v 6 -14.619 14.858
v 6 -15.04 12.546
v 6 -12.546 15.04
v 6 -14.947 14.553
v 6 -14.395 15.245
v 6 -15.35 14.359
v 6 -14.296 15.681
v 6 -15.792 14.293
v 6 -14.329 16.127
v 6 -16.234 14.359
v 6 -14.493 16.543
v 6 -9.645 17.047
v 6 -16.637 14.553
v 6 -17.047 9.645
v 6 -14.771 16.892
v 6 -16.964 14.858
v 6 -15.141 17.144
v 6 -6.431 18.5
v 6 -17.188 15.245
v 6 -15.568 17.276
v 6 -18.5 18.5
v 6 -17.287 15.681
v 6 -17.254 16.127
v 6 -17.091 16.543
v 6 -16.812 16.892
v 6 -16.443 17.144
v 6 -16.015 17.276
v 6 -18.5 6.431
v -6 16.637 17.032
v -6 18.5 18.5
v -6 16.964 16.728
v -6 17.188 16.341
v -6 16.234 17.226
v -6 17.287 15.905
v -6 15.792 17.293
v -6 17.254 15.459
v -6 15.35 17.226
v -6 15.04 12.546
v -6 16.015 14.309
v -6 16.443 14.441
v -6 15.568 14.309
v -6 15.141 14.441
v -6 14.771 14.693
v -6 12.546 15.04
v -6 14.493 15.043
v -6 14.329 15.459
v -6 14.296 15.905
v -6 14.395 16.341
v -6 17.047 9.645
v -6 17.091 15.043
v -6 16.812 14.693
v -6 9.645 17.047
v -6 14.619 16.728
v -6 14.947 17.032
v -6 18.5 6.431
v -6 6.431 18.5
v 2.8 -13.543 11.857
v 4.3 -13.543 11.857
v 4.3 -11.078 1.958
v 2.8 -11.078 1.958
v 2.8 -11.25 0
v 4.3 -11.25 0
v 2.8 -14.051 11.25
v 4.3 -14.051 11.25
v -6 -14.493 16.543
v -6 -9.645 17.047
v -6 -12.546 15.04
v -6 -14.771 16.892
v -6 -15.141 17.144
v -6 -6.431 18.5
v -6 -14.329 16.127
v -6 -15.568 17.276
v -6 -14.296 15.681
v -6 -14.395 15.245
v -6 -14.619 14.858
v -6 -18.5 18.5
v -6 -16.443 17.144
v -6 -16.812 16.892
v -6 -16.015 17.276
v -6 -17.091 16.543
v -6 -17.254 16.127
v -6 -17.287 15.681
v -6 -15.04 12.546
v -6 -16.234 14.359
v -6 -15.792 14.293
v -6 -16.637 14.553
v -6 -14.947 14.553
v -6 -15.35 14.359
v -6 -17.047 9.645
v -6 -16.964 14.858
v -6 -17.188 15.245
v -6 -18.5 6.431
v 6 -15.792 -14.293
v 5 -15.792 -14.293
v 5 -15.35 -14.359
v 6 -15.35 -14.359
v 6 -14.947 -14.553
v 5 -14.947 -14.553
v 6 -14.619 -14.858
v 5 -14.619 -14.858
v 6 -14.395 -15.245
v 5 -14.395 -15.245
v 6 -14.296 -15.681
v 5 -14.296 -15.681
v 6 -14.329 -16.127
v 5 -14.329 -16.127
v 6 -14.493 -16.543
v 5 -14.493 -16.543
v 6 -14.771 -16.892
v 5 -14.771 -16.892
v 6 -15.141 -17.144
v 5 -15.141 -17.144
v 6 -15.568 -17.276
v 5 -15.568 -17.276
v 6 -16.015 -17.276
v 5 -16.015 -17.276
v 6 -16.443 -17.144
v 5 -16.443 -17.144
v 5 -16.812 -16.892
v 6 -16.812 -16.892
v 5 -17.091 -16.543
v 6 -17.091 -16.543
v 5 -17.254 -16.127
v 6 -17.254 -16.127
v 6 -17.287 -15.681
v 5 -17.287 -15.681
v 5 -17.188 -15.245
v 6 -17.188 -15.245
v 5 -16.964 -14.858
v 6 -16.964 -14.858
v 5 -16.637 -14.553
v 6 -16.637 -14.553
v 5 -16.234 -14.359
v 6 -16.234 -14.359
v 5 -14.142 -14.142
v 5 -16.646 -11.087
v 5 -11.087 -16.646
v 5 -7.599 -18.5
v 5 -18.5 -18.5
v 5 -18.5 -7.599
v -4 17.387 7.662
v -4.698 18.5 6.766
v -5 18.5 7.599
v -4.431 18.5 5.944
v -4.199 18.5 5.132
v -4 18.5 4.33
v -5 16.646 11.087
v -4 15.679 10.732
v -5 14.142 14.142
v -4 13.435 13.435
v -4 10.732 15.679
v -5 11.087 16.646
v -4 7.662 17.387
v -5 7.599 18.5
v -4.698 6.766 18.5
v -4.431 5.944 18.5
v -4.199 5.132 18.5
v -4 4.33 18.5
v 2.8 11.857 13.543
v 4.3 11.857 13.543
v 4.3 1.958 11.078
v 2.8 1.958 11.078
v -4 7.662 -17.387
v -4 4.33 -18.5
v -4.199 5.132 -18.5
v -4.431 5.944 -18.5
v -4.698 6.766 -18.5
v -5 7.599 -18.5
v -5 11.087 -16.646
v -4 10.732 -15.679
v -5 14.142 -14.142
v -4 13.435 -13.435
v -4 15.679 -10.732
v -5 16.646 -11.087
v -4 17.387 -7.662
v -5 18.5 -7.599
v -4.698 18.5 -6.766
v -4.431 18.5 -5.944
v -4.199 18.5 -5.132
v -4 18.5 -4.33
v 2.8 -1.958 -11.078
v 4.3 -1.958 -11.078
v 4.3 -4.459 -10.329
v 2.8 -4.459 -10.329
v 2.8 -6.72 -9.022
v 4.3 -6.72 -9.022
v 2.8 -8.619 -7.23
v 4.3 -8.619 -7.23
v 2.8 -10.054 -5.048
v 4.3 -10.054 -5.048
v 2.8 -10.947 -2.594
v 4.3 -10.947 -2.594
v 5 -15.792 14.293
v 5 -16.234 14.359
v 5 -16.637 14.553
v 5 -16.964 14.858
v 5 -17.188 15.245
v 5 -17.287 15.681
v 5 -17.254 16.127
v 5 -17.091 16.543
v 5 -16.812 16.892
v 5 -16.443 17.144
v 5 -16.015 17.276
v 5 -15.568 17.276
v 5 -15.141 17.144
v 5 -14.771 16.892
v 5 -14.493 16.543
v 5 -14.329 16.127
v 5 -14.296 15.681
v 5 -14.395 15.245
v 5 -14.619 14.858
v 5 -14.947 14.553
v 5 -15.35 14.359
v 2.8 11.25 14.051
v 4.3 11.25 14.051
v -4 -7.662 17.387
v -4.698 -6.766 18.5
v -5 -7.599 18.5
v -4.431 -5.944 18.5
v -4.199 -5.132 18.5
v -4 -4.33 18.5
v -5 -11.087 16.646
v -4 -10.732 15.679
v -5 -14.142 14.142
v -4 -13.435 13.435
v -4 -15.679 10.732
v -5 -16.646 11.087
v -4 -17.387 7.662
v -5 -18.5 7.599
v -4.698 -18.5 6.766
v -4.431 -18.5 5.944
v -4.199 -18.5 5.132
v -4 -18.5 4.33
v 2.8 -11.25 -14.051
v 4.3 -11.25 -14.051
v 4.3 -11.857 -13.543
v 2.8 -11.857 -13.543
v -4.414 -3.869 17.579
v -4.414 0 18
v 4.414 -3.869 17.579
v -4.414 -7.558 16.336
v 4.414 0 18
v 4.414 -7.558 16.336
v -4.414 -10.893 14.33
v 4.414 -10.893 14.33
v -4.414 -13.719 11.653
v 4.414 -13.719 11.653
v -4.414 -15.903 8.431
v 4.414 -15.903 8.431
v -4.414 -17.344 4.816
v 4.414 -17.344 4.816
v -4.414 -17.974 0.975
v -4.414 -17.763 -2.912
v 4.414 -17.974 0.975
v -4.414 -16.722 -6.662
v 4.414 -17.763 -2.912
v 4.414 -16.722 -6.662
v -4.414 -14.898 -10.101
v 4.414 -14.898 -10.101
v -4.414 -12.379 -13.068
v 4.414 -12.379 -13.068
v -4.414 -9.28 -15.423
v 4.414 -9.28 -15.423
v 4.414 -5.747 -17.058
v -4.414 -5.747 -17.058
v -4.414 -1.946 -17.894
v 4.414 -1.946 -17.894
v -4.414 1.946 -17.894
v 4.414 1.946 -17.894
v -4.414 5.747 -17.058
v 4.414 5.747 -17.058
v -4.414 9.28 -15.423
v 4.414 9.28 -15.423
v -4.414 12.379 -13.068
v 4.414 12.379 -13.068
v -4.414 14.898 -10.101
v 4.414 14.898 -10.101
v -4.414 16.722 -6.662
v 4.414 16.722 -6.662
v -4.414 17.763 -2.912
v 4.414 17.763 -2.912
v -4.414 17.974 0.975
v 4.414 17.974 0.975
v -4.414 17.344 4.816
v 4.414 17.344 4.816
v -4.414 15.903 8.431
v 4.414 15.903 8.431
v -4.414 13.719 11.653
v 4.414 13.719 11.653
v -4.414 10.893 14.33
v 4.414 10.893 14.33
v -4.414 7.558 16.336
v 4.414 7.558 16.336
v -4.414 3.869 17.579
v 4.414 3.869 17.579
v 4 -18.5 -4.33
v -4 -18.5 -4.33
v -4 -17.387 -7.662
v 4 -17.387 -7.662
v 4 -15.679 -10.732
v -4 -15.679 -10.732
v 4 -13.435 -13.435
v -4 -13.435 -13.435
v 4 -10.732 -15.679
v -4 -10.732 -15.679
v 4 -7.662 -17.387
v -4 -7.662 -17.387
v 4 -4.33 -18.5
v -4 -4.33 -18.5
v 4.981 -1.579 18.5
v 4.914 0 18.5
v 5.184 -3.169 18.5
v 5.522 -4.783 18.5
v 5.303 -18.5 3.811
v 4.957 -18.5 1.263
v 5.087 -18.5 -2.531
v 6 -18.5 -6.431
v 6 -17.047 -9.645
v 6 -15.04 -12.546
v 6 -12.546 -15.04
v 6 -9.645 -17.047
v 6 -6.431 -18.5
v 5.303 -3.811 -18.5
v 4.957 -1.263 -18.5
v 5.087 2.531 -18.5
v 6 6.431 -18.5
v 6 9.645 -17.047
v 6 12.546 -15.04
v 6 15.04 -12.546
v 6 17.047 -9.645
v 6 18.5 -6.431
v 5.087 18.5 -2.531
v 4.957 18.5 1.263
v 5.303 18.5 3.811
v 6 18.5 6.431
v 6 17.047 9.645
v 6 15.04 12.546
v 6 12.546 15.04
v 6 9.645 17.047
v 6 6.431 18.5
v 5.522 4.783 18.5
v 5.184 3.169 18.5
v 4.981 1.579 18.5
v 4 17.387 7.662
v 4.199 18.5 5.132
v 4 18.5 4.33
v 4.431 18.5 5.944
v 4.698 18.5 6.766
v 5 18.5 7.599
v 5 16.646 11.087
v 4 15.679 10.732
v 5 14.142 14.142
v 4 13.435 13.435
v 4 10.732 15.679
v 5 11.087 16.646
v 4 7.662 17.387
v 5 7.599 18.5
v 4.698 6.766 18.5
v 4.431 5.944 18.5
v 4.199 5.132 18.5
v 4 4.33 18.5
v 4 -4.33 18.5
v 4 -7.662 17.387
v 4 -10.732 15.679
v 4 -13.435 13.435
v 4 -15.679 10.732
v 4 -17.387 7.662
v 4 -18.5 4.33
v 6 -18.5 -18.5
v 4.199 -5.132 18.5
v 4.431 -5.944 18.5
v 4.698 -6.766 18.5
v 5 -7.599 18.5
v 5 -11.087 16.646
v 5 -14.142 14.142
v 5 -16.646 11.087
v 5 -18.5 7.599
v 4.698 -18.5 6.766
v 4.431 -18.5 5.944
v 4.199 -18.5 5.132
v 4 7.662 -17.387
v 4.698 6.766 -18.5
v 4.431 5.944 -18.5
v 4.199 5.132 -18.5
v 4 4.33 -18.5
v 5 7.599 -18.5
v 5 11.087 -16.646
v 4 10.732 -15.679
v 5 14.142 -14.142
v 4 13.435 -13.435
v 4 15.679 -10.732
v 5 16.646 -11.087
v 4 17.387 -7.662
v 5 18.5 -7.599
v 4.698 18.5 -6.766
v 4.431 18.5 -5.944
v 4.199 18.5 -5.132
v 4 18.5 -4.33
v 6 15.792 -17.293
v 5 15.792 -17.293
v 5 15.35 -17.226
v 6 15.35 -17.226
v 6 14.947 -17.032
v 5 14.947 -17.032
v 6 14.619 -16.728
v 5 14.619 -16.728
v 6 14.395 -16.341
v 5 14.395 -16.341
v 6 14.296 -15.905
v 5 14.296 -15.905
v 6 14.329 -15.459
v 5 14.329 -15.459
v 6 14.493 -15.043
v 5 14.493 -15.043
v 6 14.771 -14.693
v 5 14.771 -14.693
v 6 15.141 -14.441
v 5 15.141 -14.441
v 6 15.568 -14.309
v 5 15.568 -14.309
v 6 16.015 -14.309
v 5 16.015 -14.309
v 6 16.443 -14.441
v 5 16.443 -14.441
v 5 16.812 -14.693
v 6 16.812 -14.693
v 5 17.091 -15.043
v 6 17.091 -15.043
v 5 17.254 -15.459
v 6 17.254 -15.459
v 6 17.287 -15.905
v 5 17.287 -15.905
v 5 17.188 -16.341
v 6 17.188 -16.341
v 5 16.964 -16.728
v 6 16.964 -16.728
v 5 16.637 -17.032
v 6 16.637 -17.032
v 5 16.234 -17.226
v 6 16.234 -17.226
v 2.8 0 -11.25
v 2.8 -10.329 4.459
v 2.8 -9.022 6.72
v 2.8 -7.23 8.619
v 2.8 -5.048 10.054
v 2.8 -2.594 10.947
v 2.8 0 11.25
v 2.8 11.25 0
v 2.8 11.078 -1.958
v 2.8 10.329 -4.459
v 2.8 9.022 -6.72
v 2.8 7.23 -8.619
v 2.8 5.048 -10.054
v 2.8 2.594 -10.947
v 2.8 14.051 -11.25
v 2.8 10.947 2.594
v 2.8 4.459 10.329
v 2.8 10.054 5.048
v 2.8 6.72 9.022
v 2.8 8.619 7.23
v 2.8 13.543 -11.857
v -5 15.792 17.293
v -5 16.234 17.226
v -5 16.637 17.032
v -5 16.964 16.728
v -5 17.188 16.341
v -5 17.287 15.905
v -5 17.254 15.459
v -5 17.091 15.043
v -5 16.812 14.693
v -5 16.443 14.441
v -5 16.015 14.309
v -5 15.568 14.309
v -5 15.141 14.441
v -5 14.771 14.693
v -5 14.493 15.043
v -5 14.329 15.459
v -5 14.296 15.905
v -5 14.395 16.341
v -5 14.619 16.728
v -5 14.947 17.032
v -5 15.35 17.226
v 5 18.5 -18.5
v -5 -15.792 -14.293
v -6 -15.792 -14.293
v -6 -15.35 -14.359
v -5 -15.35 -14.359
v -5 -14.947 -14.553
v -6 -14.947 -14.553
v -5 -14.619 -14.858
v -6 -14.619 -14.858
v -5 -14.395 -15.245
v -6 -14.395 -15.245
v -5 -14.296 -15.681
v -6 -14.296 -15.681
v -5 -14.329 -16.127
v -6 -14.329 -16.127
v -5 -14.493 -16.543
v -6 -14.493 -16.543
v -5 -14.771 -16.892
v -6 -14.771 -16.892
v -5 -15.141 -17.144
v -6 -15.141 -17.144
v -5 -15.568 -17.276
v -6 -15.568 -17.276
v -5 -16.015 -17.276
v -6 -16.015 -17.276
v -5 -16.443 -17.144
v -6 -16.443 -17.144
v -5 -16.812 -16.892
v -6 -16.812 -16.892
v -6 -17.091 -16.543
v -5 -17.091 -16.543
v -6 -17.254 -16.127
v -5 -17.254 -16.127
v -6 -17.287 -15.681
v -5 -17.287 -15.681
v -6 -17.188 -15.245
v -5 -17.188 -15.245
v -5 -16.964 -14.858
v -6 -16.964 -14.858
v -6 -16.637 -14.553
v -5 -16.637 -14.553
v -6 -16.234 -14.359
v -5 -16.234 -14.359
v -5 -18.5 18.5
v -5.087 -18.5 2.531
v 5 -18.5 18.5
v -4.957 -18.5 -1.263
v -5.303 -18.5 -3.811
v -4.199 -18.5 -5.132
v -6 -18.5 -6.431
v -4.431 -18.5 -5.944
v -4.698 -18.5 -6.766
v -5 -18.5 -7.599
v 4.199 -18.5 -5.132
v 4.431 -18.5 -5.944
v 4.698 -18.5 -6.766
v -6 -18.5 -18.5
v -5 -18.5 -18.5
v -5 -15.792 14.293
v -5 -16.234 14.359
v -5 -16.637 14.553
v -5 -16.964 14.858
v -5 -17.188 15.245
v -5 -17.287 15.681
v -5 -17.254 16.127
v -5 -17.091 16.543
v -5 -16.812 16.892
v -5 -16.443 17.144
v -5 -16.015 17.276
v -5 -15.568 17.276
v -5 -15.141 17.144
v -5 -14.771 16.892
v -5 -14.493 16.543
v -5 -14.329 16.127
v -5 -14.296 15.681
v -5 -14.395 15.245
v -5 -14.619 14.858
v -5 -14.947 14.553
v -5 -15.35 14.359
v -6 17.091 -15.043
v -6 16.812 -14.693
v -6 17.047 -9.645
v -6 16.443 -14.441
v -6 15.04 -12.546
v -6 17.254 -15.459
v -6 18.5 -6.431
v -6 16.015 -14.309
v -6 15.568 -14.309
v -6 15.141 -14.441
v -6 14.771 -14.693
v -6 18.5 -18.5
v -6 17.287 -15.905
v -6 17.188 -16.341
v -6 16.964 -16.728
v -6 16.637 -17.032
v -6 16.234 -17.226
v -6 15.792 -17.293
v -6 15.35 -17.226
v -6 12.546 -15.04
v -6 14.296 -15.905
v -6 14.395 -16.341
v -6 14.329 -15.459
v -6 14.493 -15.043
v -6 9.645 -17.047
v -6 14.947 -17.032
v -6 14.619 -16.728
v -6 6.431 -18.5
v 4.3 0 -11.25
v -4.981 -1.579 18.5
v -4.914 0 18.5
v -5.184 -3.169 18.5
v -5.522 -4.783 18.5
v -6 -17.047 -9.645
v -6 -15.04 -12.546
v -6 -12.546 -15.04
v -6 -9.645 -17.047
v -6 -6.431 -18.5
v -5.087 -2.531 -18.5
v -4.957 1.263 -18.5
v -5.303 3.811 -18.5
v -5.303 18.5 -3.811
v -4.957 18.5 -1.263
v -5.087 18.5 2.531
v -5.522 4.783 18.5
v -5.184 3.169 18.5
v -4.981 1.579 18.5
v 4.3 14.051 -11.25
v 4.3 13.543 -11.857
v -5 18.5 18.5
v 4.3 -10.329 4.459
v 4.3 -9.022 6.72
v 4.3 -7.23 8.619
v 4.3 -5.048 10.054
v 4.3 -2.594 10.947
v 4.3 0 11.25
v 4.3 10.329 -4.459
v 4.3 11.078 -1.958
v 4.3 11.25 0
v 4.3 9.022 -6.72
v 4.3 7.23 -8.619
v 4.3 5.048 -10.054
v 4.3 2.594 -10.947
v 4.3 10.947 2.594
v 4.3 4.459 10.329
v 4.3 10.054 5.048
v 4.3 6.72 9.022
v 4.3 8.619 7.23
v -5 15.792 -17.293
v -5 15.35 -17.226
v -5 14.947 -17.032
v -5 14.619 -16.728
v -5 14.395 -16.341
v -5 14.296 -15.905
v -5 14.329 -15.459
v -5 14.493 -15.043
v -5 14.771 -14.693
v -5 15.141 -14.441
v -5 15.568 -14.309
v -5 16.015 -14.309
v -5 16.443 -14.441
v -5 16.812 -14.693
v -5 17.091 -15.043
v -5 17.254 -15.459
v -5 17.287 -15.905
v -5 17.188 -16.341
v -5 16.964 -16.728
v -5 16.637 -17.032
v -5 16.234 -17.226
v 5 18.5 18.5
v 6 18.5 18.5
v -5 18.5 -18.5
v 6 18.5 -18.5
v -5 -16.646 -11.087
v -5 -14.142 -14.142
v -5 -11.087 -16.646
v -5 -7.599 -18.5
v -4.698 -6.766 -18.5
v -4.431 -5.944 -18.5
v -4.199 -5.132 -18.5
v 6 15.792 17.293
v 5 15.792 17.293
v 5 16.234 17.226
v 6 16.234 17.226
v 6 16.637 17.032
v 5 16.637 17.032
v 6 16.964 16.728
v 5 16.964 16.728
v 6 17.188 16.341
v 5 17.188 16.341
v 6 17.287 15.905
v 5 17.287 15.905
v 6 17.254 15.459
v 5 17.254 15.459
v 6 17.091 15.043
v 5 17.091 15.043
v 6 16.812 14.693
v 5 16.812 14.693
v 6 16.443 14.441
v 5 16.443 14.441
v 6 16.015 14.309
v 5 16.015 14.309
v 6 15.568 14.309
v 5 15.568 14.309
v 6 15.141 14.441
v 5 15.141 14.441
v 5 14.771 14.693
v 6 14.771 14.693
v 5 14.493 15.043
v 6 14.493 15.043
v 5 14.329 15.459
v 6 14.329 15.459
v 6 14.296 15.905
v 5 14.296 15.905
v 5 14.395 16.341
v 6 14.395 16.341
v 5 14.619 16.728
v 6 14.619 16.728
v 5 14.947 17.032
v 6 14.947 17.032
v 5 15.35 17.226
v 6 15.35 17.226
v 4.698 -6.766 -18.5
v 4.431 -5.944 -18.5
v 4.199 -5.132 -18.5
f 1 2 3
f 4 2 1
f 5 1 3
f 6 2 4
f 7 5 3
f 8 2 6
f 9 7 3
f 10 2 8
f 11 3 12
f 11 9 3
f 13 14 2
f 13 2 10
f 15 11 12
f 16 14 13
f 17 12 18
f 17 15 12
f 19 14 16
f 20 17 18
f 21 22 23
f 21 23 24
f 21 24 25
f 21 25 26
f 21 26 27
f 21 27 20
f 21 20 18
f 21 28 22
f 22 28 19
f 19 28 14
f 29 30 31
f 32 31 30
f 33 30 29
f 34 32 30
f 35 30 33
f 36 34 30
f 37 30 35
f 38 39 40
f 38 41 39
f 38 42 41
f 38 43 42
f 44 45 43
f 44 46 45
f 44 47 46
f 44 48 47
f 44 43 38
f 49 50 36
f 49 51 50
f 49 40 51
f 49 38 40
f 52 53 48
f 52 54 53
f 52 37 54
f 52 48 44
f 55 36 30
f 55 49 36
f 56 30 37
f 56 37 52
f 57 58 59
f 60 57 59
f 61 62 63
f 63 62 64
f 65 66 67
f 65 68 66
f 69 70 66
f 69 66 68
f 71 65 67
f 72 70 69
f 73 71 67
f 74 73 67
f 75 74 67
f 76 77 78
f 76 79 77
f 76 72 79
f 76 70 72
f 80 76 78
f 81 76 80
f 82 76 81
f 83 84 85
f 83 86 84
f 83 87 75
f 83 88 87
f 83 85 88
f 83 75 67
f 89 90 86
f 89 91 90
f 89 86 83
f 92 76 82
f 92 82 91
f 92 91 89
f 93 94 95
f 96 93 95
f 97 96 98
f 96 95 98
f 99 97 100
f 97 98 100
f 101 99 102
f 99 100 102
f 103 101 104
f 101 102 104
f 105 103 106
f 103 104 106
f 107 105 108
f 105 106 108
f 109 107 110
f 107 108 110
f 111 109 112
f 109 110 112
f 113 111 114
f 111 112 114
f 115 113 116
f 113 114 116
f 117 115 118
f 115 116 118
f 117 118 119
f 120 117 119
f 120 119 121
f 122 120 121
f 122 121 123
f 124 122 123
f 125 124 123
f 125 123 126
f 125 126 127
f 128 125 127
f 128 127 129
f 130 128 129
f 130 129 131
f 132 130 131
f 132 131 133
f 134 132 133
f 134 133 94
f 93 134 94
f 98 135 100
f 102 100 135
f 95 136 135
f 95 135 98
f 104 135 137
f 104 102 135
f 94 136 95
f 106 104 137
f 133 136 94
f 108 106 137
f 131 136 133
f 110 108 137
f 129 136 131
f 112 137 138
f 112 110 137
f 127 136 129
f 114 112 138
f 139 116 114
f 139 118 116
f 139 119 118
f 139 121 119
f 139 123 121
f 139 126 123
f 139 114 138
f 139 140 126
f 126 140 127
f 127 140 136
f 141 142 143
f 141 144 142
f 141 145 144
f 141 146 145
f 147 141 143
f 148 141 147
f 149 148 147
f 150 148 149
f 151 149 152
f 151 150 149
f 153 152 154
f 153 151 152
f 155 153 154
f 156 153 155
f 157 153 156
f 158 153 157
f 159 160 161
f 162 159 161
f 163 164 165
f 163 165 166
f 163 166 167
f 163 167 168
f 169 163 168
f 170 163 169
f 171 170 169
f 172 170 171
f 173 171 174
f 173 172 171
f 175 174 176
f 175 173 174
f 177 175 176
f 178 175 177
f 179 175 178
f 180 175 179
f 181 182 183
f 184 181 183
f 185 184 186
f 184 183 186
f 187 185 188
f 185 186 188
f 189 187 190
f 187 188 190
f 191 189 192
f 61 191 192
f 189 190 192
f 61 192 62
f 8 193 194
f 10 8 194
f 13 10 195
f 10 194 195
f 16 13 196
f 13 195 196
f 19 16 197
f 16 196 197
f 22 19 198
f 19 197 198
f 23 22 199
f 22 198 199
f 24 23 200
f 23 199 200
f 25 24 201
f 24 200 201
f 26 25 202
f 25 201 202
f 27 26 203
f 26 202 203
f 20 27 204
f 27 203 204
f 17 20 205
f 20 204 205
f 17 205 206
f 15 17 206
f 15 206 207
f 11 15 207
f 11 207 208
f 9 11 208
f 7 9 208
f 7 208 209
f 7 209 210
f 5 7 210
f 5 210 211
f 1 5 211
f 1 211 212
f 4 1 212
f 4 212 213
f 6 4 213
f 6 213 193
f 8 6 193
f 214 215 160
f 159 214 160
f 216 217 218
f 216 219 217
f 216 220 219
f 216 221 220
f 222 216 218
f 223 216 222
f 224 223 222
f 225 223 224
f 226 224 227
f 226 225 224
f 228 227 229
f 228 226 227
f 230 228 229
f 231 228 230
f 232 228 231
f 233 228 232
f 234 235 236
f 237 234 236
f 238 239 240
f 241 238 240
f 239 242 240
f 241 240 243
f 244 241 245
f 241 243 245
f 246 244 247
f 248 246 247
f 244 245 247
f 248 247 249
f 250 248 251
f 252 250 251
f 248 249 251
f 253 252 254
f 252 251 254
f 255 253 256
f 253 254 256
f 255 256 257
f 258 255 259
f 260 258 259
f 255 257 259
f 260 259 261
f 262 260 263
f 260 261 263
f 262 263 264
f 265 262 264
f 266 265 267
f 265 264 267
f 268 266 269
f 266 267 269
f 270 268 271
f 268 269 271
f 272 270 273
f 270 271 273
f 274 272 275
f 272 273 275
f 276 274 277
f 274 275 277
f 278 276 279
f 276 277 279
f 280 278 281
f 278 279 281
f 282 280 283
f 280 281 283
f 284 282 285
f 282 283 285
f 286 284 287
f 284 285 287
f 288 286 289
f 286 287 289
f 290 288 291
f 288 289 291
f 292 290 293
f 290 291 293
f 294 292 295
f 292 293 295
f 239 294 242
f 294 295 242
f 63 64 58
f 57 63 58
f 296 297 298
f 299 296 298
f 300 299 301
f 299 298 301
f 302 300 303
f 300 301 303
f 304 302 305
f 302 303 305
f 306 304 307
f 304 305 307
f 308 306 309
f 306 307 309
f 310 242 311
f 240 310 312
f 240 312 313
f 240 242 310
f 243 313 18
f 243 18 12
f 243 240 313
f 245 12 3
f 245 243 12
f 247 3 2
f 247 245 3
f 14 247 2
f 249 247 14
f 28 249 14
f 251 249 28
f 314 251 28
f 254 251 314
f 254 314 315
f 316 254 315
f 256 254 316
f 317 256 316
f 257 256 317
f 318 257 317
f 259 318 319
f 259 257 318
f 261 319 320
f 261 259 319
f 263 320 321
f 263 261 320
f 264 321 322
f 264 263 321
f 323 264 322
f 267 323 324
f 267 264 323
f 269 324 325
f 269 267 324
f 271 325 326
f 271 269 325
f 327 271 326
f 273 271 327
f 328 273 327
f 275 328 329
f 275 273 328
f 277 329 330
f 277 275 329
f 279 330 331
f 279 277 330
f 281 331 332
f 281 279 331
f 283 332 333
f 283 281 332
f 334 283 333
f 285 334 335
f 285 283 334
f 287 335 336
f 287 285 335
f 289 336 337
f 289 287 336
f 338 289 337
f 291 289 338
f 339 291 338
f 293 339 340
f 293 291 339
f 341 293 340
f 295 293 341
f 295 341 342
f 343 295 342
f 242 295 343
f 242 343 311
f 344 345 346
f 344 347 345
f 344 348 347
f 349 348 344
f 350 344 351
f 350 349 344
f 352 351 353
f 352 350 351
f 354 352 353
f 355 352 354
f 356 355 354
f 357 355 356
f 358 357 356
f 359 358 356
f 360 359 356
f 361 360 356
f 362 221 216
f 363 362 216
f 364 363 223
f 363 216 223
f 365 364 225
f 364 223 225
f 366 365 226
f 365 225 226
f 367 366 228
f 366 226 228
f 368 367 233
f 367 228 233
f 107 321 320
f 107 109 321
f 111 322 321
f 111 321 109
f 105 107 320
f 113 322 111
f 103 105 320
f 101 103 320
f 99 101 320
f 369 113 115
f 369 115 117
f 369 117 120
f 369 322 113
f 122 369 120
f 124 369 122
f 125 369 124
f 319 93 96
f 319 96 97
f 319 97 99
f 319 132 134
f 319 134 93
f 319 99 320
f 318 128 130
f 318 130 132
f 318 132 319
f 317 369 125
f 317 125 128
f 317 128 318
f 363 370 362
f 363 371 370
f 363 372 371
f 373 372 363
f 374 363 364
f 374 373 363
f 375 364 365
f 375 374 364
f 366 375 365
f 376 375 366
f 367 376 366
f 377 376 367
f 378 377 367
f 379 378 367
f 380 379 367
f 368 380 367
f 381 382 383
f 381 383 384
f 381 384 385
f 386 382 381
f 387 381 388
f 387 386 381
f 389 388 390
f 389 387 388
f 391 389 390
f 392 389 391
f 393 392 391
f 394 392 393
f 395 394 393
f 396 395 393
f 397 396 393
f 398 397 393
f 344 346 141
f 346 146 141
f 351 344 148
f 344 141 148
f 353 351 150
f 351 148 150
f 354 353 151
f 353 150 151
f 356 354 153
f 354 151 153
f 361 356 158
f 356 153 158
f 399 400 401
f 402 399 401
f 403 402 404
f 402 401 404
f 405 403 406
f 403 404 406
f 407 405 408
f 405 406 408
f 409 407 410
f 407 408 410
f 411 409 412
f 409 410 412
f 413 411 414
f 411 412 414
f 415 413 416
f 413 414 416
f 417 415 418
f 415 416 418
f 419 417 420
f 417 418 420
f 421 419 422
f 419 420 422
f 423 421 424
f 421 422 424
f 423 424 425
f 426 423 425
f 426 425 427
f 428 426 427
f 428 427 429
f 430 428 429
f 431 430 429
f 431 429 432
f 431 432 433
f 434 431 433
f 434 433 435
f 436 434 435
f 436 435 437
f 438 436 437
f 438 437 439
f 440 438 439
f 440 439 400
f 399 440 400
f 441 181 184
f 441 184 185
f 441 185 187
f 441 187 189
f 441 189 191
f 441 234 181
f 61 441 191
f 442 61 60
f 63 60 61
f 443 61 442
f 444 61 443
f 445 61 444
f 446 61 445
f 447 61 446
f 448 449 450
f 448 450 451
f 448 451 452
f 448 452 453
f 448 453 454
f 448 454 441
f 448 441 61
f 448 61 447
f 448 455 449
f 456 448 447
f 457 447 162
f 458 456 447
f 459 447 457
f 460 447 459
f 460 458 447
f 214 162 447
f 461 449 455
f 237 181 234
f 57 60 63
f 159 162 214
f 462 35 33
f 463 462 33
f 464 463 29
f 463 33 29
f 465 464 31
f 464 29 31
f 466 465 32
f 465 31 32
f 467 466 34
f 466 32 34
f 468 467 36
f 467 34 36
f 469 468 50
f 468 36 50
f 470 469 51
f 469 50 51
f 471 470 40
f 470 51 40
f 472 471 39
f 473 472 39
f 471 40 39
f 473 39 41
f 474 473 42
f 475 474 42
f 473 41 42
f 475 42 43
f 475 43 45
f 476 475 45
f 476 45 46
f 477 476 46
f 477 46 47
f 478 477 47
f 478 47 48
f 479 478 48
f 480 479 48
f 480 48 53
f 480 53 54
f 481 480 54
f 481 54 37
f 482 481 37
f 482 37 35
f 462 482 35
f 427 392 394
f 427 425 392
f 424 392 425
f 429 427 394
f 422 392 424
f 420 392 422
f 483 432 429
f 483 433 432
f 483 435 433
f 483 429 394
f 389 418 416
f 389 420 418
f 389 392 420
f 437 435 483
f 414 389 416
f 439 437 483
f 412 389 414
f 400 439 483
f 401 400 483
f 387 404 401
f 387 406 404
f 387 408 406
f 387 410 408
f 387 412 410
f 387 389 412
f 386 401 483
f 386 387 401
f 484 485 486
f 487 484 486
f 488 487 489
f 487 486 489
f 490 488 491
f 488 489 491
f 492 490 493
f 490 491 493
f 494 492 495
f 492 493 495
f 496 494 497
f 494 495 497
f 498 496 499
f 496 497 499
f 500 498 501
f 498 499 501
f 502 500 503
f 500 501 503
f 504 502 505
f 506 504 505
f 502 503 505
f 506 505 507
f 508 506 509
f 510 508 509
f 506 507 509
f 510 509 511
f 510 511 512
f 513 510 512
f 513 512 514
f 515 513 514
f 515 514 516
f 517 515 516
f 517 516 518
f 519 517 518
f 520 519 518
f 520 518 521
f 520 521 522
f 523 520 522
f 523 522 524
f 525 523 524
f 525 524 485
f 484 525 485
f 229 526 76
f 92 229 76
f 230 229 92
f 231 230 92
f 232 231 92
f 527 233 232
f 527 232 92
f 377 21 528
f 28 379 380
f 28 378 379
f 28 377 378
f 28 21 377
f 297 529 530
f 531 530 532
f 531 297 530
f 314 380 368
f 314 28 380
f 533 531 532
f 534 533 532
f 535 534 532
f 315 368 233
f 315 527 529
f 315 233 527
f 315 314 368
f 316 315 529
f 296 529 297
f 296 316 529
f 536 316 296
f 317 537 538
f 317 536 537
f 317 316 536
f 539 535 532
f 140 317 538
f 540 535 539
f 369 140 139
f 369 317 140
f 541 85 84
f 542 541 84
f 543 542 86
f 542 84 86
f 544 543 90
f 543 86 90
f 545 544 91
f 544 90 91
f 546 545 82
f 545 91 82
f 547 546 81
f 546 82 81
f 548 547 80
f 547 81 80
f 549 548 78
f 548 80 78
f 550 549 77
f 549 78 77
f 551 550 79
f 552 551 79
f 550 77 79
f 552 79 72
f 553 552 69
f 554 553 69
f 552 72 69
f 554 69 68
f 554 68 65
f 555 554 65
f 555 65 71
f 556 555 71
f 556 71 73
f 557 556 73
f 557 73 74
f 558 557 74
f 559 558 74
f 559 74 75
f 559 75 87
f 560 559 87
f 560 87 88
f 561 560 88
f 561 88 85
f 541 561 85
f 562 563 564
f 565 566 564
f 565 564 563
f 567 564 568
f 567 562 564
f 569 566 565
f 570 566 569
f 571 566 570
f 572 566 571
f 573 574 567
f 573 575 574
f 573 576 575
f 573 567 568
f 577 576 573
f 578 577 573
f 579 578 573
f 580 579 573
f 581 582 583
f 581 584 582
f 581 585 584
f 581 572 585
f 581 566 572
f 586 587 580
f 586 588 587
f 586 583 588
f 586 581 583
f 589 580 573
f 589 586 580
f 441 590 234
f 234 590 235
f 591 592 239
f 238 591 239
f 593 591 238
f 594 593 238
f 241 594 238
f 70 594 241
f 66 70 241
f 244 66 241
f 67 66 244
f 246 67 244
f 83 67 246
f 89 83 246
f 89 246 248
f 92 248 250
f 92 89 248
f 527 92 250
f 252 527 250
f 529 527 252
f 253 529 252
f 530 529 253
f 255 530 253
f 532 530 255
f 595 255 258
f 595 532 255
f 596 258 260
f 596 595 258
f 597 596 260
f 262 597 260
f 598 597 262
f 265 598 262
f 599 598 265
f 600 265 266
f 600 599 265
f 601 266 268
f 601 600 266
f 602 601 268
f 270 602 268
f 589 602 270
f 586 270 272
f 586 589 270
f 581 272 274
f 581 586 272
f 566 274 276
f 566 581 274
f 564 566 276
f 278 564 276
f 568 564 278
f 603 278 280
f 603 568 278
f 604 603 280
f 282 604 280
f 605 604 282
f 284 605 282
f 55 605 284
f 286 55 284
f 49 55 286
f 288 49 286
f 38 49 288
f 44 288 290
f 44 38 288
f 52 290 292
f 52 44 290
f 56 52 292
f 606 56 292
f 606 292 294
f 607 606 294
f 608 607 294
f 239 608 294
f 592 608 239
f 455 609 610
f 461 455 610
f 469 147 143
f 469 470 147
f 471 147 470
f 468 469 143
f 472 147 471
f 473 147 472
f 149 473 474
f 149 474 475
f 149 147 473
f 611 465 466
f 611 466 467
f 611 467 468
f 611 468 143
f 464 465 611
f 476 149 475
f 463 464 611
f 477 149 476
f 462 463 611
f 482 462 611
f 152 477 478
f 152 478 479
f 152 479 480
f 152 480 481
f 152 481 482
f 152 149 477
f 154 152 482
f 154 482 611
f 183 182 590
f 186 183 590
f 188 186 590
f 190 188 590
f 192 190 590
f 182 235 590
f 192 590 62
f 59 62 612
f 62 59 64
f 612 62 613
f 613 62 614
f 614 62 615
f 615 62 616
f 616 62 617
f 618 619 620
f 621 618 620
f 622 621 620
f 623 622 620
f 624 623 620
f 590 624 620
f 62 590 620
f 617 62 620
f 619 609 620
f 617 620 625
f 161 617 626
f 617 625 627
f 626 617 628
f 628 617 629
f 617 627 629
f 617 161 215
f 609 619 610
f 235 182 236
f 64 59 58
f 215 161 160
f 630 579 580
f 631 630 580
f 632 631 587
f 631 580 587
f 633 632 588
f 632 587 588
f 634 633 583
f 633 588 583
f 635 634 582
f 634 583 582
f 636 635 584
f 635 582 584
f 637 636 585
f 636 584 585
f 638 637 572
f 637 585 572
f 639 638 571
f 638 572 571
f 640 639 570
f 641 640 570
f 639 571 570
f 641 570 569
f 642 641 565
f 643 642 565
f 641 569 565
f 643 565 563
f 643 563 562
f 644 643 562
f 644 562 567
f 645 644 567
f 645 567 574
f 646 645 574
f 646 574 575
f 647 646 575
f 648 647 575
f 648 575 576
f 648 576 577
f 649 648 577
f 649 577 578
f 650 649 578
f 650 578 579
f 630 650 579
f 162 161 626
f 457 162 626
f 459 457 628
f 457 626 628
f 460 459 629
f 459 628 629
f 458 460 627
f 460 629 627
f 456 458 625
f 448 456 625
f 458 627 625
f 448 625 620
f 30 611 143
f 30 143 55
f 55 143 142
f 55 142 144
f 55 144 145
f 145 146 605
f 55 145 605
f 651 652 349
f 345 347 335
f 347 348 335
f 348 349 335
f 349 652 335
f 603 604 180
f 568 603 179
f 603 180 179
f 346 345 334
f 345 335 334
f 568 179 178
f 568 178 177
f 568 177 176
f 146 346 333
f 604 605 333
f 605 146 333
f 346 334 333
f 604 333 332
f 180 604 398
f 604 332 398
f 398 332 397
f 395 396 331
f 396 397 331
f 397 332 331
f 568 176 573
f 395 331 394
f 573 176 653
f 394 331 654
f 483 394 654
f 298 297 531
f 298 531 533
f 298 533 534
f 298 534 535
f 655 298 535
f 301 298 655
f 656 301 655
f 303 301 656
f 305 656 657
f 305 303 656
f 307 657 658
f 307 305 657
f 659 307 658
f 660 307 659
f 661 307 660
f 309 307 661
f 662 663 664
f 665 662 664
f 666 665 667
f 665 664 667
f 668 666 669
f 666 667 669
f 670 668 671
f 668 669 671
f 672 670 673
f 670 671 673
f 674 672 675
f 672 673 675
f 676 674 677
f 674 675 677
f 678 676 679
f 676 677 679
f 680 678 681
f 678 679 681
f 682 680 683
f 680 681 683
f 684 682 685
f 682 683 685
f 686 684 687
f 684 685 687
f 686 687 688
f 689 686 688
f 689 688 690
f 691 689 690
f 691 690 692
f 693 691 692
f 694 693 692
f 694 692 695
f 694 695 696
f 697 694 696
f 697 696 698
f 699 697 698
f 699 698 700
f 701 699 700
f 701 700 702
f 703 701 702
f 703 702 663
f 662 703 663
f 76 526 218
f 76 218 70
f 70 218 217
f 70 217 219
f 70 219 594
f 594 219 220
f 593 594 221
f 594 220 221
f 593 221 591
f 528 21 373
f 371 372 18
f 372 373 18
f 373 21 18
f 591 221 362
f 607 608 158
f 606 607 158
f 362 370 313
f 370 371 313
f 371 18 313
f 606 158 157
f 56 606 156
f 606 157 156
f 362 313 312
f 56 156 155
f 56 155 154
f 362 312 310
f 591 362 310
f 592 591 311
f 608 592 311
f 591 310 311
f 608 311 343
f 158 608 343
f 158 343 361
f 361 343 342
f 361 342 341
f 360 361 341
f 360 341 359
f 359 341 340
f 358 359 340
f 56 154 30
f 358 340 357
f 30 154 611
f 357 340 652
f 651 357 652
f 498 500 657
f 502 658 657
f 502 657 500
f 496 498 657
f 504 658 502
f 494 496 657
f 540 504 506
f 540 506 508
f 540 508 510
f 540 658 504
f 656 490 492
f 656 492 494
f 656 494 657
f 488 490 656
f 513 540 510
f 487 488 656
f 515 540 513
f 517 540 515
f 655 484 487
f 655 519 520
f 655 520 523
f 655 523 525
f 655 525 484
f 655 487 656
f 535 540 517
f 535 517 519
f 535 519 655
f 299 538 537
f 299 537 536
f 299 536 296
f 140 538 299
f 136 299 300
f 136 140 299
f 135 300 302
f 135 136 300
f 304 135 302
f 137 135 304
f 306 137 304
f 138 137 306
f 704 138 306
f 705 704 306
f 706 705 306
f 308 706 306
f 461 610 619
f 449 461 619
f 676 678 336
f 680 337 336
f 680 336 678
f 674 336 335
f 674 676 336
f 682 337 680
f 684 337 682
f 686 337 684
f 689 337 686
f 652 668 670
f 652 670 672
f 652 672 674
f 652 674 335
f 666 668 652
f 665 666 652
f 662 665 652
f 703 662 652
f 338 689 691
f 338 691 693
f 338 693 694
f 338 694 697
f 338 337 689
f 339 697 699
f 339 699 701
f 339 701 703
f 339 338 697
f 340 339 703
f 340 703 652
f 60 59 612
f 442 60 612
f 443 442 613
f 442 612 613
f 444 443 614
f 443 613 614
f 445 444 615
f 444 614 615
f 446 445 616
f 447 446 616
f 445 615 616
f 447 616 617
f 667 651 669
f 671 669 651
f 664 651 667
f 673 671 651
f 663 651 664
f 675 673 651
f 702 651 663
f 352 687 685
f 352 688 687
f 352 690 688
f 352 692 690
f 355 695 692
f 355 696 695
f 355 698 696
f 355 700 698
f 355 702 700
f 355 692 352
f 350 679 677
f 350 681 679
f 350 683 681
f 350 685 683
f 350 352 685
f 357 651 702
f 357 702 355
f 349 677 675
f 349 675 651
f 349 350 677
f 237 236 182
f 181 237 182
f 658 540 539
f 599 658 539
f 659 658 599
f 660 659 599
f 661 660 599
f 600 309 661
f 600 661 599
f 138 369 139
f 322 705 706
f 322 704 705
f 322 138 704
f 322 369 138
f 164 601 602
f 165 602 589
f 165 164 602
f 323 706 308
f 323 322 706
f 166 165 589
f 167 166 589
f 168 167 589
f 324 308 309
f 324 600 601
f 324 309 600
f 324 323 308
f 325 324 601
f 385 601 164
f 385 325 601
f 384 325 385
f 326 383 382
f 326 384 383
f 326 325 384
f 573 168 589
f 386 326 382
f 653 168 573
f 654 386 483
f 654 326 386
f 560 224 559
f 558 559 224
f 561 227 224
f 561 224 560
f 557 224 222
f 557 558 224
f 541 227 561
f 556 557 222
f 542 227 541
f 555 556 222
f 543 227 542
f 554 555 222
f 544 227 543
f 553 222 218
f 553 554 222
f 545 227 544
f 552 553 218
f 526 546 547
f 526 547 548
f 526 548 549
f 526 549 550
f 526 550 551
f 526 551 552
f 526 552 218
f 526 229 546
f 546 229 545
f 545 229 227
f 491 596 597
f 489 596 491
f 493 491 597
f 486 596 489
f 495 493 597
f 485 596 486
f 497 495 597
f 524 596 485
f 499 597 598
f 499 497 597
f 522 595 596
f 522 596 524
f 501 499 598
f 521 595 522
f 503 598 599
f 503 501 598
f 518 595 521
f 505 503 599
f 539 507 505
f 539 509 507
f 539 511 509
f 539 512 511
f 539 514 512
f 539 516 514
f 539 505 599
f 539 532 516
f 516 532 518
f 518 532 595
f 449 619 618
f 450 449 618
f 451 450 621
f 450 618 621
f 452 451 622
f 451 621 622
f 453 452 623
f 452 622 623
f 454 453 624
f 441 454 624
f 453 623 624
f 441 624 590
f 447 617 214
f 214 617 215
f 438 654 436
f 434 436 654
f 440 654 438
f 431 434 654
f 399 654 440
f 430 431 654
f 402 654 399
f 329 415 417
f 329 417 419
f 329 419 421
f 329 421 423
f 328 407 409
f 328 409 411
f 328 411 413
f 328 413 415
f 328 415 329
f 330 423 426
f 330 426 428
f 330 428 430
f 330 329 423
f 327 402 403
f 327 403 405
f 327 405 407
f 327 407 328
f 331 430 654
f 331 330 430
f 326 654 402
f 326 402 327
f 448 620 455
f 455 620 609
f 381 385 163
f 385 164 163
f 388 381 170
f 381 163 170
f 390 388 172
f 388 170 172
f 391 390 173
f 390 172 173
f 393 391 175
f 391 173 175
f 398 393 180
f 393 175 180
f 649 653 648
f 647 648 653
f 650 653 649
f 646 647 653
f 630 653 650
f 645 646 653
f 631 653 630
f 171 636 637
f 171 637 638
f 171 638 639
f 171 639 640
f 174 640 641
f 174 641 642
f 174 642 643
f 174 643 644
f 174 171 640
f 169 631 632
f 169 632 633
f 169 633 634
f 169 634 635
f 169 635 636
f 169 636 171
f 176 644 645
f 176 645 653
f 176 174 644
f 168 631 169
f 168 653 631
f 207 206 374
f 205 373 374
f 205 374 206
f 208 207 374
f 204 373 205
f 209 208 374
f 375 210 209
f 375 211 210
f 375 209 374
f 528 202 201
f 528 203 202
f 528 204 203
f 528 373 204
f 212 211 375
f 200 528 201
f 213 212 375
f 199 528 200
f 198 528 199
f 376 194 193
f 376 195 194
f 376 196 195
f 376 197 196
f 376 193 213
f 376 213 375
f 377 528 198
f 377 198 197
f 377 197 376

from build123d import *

# Parameters (mm, degrees)
SKETCH2_W          = 135.101639281
SKETCH2_H          = 124.912409503
SKETCH2_W_2        = 37
SKETCH2_H_2        = 37
CUT_EXTRUDE1_DEPTH = 51.927558111
SKETCH7_R          = 1.5
CUT_EXTRUDE2_DEPTH = 29.783675929
EXTRUDE8_START     = -1.7
EXTRUDE8_DEPTH     = 1.5


with BuildPart() as part:
    # Sketch1 → Revolve1 (revolve)
    with BuildSketch(Plane.XY, mode=Mode.PRIVATE) as revolve1_sk:
        Polygon((0, 19), (4, 19), (5, 20), (5, 34.997258286), (6, 34.997258286), (6, 19.585786438), (4.414213562, 18), (0, 18), (-4.414213562, 18), (-6, 19.585786438), (-6, 34.997258286), (-5, 34.997258286), (-5, 20), (-4, 19), align=None)
    revolve(revolve1_sk.sketch.rotate(Axis((0, 0, 0), (1, 0, 0)), 90), axis=Axis((0, 0, 0), (1, 0, 0)))

    # Sketch2 → Cut-Extrude1 (cut, through all)
    with BuildSketch(Plane(origin=(6, 0, 0), x_dir=(0, 0, -1), z_dir=(1, 0, 0))):
        with Locations((-3.490754647, 1.981239123)):
            Rectangle(SKETCH2_W, SKETCH2_H)
        Rectangle(SKETCH2_W_2, SKETCH2_H_2, mode=Mode.SUBTRACT)
    extrude(amount=-CUT_EXTRUDE1_DEPTH, mode=Mode.SUBTRACT)

    # Sketch7 → Cut-Extrude2 (cut, through all)
    with BuildSketch(Plane.ZY.offset(6)):
        with Locations((15.792736582, 15.791678814)):
            Circle(SKETCH7_R)
        with Locations(Location((15.792736582, -15.791678814, 0), (0, 0, 180))):
            Circle(SKETCH7_R)
        with Locations((-15.792736582, -15.791678814)):
            Circle(SKETCH7_R)
        with Locations(Location((-15.792736582, 15.791678814, 0), (0, 0, 180))):
            Circle(SKETCH7_R)
    extrude(amount=-CUT_EXTRUDE2_DEPTH, mode=Mode.SUBTRACT)


with BuildPart() as body_2:
    # Sketch8 → Extrude8 (new body)
    with BuildSketch(Plane(origin=(6, 0, 0), x_dir=(0, 0, -1), z_dir=(1, 0, 0)).offset(EXTRUDE8_START)):
        with BuildLine():
            Line((0, 11.25), (11.25, 14.051245496))
            Line((11.25, 14.051245496), (11.856665779, 13.543244685))
            Line((11.856665779, 13.543244685), (1.957575689, 11.078375216))
            ThreePointArc((1.957575689, 11.078375216), (8.619316287, 7.229791612), (11.25, 0))
            Line((11.25, 0), (14.051245496, -11.25))
            Line((14.051245496, -11.25), (13.543244685, -11.856665779))
            Line((13.543244685, -11.856665779), (11.078375216, -1.957575689))
            ThreePointArc((11.078375216, -1.957575689), (7.229791612, -8.619316287), (0, -11.25))
            Line((0, -11.25), (-11.25, -14.051245496))
            Line((-11.25, -14.051245496), (-11.856665779, -13.543244685))
            Line((-11.856665779, -13.543244685), (-1.957575689, -11.078375216))
            ThreePointArc((-1.957575689, -11.078375216), (-8.619316287, -7.229791612), (-11.25, 0))
            Line((-11.25, 0), (-14.051245496, 11.25))
            Line((-14.051245496, 11.25), (-13.543244685, 11.856665779))
            Line((-13.543244685, 11.856665779), (-11.078375216, 1.957575689))
            ThreePointArc((-11.078375216, 1.957575689), (-7.229791612, 8.619316287), (0, 11.25))
        make_face()
    extrude(amount=-EXTRUDE8_DEPTH)


solid = Compound([part.part, body_2.part])
